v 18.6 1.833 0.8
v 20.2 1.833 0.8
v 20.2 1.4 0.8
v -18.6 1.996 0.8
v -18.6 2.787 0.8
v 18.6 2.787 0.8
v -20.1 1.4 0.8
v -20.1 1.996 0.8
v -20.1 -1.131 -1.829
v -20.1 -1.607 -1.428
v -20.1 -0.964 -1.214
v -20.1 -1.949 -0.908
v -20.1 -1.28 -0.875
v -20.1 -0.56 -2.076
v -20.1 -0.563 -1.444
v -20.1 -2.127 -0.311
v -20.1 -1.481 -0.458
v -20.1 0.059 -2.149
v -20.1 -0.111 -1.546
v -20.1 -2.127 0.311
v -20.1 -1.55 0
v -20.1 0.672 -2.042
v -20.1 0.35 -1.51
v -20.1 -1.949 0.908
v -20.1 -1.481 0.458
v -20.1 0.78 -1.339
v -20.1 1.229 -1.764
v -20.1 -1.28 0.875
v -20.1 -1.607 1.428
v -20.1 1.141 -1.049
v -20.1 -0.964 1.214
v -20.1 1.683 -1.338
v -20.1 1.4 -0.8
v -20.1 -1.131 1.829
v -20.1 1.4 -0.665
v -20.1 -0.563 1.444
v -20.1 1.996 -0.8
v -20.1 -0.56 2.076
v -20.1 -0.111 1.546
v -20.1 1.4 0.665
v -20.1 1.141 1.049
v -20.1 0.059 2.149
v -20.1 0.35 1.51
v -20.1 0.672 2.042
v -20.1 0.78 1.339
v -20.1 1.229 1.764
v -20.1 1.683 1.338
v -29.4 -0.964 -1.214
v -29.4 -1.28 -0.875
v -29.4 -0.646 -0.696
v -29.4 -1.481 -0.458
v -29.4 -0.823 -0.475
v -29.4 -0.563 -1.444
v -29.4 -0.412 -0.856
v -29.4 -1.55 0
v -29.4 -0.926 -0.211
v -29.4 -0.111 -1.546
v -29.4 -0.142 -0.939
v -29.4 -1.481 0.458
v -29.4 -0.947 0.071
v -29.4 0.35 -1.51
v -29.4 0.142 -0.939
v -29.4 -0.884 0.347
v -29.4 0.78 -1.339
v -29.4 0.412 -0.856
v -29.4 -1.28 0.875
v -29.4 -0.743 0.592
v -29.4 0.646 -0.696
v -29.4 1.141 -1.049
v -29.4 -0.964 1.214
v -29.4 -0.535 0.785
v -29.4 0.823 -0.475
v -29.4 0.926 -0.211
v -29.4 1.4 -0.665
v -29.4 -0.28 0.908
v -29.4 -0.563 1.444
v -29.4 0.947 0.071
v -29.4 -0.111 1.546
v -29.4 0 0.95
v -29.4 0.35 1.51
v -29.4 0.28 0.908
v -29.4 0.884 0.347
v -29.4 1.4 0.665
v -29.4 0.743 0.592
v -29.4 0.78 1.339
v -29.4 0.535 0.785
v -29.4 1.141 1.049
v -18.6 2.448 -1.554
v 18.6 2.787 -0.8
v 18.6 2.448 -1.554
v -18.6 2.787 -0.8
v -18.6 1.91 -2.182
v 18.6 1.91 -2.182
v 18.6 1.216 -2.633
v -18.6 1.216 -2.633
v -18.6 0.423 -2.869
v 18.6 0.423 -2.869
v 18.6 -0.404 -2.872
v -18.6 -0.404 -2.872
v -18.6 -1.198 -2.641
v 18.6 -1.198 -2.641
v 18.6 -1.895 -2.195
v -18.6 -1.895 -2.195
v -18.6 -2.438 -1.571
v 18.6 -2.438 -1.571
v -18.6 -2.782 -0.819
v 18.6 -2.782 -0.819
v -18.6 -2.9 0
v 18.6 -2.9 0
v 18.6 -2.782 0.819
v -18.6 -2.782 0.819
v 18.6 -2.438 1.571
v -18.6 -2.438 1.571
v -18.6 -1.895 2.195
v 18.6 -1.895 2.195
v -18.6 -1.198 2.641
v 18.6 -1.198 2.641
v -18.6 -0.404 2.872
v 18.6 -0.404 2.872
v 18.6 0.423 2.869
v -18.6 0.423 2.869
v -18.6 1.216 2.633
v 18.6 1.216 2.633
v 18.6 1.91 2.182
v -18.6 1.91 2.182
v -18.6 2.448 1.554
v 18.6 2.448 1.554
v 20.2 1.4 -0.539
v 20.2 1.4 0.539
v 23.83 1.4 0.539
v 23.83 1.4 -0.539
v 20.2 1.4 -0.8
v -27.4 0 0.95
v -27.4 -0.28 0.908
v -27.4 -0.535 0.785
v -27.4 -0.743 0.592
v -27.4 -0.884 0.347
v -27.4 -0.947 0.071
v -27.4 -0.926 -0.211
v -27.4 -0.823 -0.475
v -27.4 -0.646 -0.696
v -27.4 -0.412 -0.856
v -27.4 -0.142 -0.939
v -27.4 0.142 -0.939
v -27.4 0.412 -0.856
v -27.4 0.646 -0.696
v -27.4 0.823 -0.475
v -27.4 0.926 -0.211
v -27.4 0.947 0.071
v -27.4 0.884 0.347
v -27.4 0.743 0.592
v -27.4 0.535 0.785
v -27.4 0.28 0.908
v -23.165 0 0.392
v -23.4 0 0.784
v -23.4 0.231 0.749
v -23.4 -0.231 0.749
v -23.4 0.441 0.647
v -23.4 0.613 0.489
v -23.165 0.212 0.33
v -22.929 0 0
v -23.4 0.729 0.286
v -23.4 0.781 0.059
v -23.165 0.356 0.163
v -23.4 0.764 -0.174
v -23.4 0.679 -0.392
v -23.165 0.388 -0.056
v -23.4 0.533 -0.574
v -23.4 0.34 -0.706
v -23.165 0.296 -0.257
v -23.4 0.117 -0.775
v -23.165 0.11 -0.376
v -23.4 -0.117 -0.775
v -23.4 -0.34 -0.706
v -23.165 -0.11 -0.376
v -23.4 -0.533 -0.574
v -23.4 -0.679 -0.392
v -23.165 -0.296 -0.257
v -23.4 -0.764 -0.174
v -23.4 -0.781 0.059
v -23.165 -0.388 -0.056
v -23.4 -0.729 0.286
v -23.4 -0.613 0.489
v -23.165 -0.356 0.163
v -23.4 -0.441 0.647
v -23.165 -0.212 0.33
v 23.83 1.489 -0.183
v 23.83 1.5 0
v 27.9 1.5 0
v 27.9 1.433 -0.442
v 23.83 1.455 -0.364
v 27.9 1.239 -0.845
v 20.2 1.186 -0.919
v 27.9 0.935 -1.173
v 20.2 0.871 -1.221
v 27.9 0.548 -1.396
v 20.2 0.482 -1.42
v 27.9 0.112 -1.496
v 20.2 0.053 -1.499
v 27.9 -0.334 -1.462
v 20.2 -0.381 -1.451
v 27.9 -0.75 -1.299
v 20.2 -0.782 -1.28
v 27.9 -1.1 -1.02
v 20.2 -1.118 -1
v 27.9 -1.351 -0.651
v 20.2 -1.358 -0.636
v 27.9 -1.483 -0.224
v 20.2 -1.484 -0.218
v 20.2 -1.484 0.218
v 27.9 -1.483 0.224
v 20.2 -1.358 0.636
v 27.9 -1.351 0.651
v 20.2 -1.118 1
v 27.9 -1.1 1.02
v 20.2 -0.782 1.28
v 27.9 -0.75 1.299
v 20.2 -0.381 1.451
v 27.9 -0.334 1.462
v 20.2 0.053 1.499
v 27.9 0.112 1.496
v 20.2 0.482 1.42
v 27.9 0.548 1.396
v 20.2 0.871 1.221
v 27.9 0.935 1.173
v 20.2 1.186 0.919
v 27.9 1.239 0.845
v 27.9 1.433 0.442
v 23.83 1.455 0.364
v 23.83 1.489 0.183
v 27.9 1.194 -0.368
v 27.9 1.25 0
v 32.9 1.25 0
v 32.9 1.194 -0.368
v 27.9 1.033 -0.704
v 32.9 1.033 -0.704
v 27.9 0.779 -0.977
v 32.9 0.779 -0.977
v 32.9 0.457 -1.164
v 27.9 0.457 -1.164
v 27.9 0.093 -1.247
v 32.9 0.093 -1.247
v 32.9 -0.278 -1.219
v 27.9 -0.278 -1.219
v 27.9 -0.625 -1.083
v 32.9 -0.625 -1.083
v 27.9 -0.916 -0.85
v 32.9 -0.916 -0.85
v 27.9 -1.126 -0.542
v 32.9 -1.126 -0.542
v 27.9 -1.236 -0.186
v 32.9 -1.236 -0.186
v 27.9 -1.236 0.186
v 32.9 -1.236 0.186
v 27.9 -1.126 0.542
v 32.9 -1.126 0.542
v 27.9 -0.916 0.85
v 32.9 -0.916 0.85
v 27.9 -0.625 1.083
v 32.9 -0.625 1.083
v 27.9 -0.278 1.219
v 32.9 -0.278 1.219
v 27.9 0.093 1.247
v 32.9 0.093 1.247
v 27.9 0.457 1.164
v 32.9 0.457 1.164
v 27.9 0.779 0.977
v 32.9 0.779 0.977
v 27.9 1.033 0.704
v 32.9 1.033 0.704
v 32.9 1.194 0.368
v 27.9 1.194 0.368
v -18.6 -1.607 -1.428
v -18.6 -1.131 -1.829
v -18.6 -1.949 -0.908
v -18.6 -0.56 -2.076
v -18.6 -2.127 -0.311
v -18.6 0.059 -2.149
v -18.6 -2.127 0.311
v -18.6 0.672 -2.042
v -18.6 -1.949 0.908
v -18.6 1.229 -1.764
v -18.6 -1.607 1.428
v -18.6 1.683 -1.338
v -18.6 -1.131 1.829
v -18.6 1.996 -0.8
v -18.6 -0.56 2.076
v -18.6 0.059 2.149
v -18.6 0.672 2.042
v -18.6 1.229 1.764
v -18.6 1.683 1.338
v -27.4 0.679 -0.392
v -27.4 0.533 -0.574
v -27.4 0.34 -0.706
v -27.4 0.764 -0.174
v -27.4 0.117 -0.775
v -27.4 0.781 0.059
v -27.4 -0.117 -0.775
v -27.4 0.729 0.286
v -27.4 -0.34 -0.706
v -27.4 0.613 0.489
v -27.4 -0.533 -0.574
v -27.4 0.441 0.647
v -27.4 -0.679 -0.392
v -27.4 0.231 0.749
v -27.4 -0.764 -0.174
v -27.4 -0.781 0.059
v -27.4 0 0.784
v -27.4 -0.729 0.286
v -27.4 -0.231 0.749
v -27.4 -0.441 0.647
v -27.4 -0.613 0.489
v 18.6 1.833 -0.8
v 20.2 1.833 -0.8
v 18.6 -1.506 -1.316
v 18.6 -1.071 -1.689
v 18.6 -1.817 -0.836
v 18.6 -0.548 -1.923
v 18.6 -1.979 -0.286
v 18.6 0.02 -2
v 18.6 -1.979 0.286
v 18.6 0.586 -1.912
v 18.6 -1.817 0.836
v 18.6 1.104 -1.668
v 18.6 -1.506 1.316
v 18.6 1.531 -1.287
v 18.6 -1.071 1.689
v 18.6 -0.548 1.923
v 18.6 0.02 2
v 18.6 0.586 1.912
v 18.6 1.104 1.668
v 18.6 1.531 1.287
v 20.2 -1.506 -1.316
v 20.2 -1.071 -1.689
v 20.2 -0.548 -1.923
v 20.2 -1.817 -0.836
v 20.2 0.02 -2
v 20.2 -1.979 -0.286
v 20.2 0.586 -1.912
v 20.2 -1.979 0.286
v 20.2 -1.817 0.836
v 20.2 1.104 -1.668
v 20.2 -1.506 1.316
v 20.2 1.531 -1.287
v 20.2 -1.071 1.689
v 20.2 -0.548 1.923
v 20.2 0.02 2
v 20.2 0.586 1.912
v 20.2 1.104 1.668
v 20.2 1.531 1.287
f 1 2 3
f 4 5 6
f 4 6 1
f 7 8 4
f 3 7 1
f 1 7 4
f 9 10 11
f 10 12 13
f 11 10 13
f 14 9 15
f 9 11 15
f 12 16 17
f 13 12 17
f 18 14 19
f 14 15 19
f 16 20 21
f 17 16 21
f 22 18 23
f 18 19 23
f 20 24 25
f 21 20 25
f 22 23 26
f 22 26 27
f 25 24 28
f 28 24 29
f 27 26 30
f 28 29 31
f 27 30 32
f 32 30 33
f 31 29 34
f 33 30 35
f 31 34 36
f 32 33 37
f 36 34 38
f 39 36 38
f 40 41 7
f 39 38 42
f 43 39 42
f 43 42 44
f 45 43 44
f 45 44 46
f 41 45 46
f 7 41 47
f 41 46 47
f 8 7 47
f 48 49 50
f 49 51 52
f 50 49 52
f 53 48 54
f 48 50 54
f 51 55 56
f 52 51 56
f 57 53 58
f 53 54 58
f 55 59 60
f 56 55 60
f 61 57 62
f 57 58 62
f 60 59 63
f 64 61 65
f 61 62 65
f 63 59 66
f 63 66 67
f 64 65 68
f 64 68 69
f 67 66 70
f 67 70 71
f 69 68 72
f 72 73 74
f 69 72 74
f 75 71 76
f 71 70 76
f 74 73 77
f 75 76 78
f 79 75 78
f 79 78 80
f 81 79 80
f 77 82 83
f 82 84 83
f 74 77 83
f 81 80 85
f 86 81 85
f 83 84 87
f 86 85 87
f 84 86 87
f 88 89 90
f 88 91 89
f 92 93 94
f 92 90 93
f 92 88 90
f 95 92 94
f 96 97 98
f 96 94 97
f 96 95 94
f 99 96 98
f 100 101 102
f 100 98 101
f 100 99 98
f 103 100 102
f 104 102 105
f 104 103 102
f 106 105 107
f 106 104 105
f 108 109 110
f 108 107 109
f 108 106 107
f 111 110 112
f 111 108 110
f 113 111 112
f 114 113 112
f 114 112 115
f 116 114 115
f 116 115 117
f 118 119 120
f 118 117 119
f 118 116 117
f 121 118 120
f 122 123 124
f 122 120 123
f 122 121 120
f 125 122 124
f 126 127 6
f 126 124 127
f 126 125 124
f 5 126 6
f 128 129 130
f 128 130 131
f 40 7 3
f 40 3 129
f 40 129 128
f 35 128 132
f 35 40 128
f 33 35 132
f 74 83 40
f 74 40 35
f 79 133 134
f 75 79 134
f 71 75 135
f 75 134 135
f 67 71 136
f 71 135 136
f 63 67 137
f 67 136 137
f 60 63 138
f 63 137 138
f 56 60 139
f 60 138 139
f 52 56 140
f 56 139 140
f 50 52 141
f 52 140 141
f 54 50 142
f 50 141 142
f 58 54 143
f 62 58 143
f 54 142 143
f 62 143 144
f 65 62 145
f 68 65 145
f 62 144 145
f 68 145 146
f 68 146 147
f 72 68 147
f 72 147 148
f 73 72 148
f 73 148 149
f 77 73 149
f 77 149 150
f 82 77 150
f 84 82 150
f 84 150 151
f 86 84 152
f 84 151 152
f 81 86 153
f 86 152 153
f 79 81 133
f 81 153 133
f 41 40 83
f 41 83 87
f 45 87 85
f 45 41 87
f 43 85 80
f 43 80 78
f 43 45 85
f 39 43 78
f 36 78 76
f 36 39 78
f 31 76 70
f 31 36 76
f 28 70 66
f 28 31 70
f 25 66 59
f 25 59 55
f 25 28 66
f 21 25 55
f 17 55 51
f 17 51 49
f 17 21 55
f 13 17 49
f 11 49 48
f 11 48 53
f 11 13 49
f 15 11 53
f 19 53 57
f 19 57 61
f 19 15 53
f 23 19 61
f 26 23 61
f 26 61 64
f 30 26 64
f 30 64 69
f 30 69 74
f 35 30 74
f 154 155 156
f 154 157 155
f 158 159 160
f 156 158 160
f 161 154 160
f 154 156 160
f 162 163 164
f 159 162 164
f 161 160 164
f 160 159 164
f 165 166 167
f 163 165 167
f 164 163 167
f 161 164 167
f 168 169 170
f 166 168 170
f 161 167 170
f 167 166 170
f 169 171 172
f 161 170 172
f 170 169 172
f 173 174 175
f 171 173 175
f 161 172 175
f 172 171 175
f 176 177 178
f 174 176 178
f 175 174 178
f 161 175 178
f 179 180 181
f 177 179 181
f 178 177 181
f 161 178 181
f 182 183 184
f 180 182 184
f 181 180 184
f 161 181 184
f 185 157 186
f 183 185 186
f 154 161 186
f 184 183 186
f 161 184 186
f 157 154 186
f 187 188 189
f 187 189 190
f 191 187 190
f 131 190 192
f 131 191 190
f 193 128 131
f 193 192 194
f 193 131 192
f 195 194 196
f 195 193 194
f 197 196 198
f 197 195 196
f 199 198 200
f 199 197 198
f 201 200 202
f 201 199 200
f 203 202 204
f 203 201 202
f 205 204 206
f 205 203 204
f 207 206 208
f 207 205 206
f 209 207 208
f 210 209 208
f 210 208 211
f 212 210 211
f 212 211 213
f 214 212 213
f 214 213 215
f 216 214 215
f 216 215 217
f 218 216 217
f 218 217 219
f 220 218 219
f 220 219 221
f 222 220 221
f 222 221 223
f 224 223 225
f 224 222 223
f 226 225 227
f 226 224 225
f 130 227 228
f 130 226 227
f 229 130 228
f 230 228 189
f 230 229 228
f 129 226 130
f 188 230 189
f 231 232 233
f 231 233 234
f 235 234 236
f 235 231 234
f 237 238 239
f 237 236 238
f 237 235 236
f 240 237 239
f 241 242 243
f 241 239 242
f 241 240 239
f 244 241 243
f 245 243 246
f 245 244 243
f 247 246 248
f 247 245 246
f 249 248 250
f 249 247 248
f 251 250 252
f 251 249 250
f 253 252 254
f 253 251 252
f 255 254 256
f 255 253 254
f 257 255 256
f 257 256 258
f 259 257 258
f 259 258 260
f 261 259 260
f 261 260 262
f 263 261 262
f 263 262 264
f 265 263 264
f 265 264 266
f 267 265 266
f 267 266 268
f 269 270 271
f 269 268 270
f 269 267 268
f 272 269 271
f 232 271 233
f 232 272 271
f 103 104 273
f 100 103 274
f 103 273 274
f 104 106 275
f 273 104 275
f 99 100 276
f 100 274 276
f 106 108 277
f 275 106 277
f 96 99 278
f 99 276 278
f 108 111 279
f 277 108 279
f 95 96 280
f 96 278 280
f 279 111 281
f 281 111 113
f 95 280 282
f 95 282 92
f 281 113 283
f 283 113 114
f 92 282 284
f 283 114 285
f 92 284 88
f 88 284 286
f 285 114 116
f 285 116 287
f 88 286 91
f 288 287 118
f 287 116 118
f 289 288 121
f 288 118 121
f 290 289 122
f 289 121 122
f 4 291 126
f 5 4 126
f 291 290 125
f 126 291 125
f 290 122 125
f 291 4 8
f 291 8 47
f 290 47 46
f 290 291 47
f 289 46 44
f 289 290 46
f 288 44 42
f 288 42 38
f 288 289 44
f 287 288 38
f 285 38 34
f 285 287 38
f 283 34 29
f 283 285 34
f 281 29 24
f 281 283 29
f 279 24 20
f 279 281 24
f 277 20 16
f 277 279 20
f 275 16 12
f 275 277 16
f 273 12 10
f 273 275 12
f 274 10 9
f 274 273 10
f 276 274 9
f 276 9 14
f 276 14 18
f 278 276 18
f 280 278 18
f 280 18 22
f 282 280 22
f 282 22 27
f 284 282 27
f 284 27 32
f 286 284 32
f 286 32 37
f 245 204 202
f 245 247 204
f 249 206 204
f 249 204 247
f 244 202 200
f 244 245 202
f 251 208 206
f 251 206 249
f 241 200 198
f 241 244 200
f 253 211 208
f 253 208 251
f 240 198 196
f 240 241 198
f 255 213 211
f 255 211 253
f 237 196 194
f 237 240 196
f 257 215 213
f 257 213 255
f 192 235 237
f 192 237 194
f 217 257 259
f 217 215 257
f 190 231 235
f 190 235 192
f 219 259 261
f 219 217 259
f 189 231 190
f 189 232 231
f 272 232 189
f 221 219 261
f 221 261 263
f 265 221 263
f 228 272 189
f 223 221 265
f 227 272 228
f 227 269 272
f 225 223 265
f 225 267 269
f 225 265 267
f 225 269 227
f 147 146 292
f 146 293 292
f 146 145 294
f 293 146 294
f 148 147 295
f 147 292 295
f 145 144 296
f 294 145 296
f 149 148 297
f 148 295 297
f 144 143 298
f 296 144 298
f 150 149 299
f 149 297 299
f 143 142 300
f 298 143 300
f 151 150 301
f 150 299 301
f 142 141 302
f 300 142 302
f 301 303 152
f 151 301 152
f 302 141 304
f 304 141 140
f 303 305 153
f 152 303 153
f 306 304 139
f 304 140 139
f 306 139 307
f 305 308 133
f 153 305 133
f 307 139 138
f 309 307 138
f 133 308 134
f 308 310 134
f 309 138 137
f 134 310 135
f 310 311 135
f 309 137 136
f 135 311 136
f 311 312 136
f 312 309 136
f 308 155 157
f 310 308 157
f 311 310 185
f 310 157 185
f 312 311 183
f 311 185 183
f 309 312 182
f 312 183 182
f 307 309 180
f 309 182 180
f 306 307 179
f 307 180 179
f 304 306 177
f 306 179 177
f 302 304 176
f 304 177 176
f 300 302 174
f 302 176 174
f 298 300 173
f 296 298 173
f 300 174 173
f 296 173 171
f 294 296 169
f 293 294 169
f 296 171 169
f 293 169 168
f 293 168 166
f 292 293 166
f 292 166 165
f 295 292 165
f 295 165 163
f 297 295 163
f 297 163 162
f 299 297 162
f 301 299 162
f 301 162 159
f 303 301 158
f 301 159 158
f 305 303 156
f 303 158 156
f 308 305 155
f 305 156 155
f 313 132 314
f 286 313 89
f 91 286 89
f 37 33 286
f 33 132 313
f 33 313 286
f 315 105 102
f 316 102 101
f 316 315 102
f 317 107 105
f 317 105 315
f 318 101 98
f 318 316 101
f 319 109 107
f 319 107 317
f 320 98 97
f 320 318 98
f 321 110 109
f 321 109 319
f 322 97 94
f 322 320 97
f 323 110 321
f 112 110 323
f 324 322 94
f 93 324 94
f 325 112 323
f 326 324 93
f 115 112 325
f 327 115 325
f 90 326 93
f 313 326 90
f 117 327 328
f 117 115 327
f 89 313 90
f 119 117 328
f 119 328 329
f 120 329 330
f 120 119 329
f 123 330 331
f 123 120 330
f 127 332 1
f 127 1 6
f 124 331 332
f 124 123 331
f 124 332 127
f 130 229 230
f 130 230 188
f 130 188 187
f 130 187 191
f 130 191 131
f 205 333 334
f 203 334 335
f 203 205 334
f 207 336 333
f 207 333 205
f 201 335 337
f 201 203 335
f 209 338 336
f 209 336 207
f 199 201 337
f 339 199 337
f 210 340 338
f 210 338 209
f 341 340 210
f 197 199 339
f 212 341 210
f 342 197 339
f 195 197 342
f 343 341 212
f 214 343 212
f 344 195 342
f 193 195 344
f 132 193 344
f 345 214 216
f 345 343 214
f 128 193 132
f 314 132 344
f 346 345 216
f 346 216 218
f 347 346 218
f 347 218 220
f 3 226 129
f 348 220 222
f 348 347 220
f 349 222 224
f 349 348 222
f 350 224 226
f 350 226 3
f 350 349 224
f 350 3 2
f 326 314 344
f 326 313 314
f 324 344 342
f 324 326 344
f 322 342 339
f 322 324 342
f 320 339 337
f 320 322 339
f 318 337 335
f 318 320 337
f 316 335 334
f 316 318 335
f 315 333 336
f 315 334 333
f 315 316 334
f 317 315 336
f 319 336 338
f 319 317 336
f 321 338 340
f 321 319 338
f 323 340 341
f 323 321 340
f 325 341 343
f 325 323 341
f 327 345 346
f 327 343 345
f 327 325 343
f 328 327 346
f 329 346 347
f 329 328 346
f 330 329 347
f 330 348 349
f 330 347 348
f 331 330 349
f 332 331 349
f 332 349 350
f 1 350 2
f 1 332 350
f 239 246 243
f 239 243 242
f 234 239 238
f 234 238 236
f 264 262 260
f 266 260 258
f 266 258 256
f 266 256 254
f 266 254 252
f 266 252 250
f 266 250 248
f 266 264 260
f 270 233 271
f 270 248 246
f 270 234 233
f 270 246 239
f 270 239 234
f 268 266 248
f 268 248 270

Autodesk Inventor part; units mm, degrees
ref_plane "YZ Plane" through (0, 0, 0) normal (1, 0, 0) x (0, 1, 0)
ref_plane "XZ Plane" through (0, 0, 0) normal (0, 1, 0) x (-1, 0, 0)
ref_plane "XY Plane" through (0, 0, 0) normal (0, 0, 1) x (1, 0, 0)
sketch "Sketch1" plane through (0, 0, 0) normal (0, 0, 1) x (1, 0, 0)
  line L0 (-18.6, 0) -> (18.6, 0)
  line L1 (18.6, 0) -> (18.6, 2.9)
  line L2 (18.6, 2.9) -> (-18.6, 2.9)
  line L3 (-18.6, 2.9) -> (-18.6, 0)
  line L4 (-18.6, 0) -> (-20.1, 0)
  line L5 (-20.1, 0) -> (-20.1, 2.15)
  line L6 (-20.1, 2.15) -> (-18.6, 2.15)
  line L7 (-18.6, 2.15) -> (-18.6, 0)
  line L8 (-20.1, 0) -> (-29.4, 0)
  line L9 (-29.4, 0) -> (-29.4, 1.55)
  line L10 (-29.4, 1.55) -> (-20.1, 1.55)
  line L11 (-20.1, 1.55) -> (-20.1, 0)
  line L12 (18.6, 0) -> (20.2, 0)
  line L13 (20.2, 0) -> (20.2, 2)
  line L14 (20.2, 2) -> (18.6, 2)
  line L15 (18.6, 2) -> (18.6, 0)
  line L16 (20.2, 0) -> (27.9, 0)
  line L17 (27.9, 0) -> (27.9, 1.5)
  line L18 (27.9, 1.5) -> (20.2, 1.5)
  line L19 (20.2, 1.5) -> (20.2, 0)
  line L20 (27.9, 0) -> (32.9, 0)
  line L21 (32.9, 0) -> (32.9, 1.25)
  line L22 (32.9, 1.25) -> (27.9, 1.25)
  line L23 (27.9, 1.25) -> (27.9, 0)
  point P0 (0, 0)
  point P1 (0, 0)
  dimension "d0" = 9.3
  dimension "d1" = 10.8
  dimension "d2" = 48
  dimension "d3" = 3.1
  dimension "d4" = 4.3
  dimension "d5" = 5.8
  dimension "d6" = 3
  dimension "d7" = 49.6
  dimension "d26" = 2.5
  dimension "d27" = 5
  dimension "d28" = 62.3
  dimension "d29" = 4
revolve "Revolution1" add sketch "Sketch1" angle 360 about axis through (-18.6, 0, 0) along (1, 0, 0)
thread "Thread1" size "M2.5x0.45" class "6g" standard "ANSI Metric M Profile" length 5
hole "Hole1" at (-29.4, 0, 0) direction (1, 0, 0) diameter 1.567 depth 6 tip angle 118 counterbore diameter 1.9 counterbore depth 2 thread size "M2x0.4" class "6H" standard "ANSI Metric M Profile"
sketch "Sketch2" plane through (-29.4, 0, 0) normal (-1, 0, 0) x (0, 0, 1)
  circle A0 centre (0, 0) radius 2.9 projected
  line L0 (-0.8, 2.7875) -> (0.8, 2.7875)
  line L1 (0.8, 2.7875) -> (0.8, 1.4)
  line L2 (0.8, 1.4) -> (-0.8, 1.4)
  line L3 (-0.8, 1.4) -> (-0.8, 2.7875)
  dimension "d22" = 1.6
  dimension "d25" = 4.3
extrude "Extrusion1" cut sketch "Sketch2" against normal blind 53.23 contours L0 A0 | L1 L2 L3 L0
properties part number "401-01" material "Aluminum-6061"
